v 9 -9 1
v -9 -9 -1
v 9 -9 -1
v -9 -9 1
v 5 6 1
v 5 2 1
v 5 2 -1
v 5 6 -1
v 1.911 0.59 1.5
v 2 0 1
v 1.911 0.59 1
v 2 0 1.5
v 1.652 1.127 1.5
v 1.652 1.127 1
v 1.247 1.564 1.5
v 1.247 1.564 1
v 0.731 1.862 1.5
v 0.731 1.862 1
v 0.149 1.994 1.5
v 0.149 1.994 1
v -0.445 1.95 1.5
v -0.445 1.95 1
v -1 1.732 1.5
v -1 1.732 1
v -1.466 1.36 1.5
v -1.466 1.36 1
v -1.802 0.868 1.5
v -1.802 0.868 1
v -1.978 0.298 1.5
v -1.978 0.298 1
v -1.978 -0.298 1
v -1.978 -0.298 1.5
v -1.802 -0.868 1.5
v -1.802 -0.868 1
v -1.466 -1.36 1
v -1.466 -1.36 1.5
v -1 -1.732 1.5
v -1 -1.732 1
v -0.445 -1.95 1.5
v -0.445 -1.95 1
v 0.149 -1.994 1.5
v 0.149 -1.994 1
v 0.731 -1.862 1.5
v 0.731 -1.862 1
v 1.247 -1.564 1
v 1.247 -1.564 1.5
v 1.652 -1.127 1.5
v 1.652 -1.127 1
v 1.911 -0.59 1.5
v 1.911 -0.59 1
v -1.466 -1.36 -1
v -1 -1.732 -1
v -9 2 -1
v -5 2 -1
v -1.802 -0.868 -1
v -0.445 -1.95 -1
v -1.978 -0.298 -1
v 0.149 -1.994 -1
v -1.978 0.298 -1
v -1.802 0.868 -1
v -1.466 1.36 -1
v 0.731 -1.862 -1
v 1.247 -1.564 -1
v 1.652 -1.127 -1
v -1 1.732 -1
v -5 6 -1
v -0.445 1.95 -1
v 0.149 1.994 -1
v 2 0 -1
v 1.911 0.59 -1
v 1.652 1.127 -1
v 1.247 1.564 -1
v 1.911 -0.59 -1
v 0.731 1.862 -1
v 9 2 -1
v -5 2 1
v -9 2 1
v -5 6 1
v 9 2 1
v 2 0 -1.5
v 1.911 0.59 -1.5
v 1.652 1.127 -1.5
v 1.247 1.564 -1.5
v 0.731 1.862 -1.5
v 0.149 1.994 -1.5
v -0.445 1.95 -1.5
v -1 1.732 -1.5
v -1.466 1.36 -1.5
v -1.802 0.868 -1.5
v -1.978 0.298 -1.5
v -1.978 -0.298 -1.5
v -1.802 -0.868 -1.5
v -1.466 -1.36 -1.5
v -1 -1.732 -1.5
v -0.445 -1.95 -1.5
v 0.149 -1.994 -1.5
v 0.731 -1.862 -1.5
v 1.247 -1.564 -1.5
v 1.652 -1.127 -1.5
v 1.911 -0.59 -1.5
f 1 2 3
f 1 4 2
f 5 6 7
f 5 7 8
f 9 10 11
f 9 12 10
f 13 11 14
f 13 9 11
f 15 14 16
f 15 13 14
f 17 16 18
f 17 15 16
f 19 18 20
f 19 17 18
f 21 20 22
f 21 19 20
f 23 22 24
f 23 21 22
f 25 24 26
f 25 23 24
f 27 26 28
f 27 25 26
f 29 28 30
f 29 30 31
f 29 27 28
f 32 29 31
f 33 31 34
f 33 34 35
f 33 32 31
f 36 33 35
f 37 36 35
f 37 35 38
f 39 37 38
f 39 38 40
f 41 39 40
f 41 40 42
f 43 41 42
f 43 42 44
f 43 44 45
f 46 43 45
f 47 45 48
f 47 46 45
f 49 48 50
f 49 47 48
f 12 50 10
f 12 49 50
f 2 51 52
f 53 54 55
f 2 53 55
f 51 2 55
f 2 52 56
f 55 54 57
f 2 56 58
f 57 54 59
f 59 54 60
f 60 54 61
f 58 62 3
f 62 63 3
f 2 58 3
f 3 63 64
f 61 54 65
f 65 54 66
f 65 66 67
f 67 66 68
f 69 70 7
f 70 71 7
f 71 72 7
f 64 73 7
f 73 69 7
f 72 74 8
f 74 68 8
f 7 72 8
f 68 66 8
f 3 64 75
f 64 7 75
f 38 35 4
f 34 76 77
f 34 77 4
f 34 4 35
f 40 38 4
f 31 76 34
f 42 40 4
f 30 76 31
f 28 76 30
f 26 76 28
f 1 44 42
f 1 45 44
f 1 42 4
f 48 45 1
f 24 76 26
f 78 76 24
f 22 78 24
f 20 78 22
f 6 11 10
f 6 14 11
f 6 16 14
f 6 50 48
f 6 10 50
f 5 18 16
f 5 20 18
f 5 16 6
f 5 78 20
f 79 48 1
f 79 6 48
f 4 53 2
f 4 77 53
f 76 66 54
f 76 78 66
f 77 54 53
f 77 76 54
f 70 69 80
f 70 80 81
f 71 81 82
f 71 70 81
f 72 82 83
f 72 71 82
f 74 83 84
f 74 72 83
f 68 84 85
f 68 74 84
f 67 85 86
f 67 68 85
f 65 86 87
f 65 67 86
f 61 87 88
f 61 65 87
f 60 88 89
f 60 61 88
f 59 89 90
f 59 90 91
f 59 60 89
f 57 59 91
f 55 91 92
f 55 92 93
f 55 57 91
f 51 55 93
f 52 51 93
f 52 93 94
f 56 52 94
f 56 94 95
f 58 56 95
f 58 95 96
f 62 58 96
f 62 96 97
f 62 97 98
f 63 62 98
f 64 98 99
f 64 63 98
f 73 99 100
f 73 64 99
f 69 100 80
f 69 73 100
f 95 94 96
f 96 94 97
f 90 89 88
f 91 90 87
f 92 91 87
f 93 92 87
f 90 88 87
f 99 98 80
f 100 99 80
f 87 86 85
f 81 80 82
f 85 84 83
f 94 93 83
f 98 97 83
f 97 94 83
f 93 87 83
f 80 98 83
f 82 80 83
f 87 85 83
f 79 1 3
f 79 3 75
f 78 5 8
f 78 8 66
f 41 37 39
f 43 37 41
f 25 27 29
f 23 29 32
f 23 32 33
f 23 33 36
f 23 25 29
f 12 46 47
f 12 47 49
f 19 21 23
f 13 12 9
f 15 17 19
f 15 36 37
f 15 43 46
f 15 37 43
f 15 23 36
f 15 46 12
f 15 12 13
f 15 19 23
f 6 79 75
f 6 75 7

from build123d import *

# Parameters (mm, degrees)
F0_R     = 2
F1_DEPTH = 1
F2_DEPTH = 1.5


with BuildPart() as f1:
    # F0 (on Top) → F1 (new body, symmetric)
    with BuildSketch(Plane.XY):
        Polygon((-9, -9), (9, -9), (9, 2), (5, 2), (5, 6), (-5, 6), (-5, 2), (-9, 2), align=None)
        Circle(F0_R, mode=Mode.SUBTRACT)
    extrude(amount=F1_DEPTH, both=True)

    # F0 (on Top) → F2 (join, symmetric)
    with BuildSketch(Plane.XY):
        Circle(F0_R)
    extrude(amount=F2_DEPTH, both=True)


solid = f1.part
